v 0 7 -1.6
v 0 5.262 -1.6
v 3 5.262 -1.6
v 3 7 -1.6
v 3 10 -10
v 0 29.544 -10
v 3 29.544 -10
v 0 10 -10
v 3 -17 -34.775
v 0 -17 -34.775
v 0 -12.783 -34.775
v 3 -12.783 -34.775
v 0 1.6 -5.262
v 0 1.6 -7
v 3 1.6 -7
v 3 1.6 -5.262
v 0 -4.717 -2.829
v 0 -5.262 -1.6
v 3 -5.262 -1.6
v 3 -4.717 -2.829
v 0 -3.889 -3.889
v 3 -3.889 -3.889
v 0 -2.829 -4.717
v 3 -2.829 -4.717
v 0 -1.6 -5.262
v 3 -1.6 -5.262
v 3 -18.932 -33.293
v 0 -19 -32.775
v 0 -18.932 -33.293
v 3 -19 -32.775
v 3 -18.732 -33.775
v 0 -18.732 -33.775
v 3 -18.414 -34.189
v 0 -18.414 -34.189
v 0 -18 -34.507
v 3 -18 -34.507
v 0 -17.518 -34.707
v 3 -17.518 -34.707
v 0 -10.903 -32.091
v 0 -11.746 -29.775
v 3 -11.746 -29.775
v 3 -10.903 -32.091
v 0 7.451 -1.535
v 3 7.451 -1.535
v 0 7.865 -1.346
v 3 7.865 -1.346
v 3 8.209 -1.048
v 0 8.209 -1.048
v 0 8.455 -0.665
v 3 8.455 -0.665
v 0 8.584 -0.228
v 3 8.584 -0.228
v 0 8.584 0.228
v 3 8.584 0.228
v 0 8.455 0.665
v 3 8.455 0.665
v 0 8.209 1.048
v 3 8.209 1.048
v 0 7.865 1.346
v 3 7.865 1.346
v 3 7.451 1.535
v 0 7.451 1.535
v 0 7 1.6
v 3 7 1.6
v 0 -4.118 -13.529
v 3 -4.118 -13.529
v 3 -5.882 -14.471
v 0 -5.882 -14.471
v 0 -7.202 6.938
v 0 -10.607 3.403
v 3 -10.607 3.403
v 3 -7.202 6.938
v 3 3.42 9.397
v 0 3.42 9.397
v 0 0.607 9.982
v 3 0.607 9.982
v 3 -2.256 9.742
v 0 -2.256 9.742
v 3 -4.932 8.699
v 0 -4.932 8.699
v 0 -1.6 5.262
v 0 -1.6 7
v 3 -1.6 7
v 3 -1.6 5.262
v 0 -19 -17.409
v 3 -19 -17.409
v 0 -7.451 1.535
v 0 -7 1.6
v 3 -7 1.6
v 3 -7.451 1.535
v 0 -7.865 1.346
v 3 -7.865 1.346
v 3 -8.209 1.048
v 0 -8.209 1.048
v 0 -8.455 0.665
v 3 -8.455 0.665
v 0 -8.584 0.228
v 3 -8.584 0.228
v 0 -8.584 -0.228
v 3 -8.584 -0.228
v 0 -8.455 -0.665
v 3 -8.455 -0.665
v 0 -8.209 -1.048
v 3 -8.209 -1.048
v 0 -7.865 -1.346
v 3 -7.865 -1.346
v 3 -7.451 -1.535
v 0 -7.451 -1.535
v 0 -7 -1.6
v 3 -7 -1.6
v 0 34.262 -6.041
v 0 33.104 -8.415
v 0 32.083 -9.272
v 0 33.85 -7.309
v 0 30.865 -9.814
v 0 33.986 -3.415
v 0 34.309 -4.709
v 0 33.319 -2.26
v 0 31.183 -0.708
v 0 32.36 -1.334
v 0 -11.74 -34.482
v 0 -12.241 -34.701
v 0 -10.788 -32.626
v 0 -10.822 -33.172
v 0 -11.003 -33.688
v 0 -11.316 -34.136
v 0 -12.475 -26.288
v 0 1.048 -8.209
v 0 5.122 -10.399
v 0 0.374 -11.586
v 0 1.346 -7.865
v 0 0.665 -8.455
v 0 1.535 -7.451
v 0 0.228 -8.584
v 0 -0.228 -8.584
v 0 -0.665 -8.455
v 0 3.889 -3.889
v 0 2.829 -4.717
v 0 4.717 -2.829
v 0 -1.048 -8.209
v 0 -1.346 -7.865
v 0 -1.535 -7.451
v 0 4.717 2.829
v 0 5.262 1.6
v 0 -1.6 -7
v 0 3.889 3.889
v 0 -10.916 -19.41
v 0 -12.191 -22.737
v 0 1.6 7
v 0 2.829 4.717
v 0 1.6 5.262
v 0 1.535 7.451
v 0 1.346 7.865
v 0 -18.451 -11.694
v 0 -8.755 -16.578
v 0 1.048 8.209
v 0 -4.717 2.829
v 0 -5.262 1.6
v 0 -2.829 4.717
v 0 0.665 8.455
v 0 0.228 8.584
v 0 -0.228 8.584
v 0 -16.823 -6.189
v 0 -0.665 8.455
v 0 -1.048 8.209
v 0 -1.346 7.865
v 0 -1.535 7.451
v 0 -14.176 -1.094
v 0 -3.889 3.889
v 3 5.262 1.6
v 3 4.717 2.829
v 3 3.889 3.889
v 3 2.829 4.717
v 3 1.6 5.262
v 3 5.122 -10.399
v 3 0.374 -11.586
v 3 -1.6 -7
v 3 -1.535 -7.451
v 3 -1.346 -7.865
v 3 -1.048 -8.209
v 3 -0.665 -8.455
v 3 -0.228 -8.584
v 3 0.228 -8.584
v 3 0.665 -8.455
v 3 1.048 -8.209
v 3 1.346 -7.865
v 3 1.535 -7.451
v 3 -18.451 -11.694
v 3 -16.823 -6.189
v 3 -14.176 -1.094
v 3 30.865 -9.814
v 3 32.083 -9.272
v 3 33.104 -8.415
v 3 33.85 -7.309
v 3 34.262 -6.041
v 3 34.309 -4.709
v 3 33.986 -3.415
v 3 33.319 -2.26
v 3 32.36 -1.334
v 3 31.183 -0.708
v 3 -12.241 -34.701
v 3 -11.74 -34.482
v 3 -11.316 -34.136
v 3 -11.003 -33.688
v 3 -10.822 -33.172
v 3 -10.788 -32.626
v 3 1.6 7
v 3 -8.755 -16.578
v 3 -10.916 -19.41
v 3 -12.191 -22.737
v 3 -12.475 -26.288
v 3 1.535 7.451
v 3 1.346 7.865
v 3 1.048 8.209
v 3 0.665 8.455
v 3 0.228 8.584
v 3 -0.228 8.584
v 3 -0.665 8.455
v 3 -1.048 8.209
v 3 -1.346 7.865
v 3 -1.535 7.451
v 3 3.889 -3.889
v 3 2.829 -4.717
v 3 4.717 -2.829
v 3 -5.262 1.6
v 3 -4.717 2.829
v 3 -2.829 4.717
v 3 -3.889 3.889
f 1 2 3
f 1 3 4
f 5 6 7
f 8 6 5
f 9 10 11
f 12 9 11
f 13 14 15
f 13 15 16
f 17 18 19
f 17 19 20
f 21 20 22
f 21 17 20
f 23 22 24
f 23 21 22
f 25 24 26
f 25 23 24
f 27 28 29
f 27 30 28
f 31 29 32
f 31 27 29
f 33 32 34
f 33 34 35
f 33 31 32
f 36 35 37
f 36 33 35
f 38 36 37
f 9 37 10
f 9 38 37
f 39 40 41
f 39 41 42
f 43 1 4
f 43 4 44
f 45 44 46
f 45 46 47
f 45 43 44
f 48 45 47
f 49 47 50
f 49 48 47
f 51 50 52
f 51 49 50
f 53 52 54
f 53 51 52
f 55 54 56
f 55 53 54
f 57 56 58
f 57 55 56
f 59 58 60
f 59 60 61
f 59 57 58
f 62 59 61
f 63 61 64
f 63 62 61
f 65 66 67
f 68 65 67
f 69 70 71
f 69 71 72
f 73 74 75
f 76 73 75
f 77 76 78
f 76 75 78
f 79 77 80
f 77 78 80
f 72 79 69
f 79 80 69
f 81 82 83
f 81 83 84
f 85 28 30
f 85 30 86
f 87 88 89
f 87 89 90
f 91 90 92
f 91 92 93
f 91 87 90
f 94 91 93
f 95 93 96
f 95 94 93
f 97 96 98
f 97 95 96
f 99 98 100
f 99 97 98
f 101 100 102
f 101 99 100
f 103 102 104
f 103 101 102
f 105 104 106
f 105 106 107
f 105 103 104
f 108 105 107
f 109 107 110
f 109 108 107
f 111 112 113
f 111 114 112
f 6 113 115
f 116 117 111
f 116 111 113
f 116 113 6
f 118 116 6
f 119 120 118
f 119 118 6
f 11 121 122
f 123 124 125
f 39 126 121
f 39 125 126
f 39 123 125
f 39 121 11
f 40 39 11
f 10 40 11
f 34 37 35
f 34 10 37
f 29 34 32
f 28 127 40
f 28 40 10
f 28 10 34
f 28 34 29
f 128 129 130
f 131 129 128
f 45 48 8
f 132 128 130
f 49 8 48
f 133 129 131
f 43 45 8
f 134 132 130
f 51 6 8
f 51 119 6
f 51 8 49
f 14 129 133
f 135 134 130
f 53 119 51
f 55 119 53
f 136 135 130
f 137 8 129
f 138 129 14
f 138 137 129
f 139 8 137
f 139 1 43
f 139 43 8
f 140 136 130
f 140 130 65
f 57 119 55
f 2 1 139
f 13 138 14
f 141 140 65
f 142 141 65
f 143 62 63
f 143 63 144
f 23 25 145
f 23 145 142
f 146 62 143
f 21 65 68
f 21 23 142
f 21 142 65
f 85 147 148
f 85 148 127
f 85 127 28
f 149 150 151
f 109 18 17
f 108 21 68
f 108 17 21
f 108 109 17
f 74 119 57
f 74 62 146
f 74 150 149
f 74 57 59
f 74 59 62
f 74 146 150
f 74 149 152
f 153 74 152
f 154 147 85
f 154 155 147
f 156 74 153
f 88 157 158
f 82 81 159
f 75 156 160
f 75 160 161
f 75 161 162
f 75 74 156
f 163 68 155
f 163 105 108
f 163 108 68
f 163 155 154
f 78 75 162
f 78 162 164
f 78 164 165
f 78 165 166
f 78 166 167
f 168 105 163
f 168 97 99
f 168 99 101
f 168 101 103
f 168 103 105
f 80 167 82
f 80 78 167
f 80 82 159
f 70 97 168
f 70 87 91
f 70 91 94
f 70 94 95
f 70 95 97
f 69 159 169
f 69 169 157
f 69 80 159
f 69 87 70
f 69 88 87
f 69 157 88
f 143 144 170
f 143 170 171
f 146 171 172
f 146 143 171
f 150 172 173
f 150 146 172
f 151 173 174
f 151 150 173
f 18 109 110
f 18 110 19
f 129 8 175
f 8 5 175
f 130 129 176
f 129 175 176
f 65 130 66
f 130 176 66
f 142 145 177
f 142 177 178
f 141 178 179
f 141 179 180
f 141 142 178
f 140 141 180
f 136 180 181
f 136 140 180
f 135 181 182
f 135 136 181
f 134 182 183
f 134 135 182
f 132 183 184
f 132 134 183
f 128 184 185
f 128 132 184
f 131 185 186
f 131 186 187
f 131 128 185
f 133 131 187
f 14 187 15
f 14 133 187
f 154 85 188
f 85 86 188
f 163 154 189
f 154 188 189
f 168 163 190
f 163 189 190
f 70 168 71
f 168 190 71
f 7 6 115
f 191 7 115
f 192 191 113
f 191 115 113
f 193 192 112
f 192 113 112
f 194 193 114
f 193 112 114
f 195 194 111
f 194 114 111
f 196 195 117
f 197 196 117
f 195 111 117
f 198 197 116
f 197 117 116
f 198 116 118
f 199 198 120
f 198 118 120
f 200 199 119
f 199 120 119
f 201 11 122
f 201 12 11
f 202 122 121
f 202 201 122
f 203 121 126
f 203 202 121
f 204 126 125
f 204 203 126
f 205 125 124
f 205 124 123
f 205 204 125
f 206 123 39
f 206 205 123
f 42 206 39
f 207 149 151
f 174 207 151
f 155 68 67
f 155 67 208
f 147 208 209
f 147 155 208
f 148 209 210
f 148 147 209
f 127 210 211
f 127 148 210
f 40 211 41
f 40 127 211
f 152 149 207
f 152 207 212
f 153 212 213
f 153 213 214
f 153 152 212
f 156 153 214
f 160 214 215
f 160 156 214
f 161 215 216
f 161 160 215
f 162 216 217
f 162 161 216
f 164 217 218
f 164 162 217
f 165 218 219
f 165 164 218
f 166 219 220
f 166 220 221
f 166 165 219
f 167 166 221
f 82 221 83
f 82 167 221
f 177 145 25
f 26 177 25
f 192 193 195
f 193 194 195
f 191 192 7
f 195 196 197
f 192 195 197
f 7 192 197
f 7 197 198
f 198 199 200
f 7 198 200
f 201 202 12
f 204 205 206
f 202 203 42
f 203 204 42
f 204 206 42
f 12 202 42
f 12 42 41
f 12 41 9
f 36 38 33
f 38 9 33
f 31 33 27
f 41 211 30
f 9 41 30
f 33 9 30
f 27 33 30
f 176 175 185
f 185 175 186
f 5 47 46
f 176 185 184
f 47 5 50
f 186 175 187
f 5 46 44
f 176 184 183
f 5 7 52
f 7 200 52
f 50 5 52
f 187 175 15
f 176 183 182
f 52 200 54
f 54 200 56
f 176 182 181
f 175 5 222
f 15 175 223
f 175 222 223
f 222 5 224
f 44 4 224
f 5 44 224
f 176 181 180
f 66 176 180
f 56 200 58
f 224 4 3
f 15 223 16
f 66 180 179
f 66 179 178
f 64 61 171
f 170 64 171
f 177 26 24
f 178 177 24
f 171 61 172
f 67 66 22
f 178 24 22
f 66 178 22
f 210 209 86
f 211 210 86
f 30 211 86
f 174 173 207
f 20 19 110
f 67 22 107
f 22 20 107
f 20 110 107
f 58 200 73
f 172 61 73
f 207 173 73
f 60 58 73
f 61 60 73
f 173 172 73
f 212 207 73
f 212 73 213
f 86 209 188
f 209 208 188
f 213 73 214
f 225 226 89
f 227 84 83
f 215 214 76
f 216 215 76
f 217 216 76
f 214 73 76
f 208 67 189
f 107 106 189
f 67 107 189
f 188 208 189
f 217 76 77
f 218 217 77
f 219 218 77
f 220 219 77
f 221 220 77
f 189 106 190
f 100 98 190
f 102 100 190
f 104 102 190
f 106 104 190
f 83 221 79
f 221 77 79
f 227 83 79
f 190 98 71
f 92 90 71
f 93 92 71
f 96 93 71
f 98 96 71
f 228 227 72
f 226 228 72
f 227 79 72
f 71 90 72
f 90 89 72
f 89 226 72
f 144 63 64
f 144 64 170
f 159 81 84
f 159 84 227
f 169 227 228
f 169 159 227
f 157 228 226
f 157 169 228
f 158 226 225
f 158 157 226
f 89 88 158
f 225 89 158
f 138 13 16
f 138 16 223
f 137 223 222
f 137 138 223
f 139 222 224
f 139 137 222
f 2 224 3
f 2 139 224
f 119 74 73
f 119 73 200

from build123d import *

# Parameters (mm, degrees)
PAD054_DEPTH = 3
FILLET009_R  = 2
FILLET010_R  = 30


with BuildPart() as part:
    # Sketch105 → Pad054 (new body)
    with BuildSketch(Plane.YZ):
        with BuildLine():
            Line((-19, -34.775252), (-19, -5.310494))
            Line((-19, -5.310494), (-7.202157, 6.937502))
            ThreePointArc((3.420201, 9.396926), (-2.255657, 9.74228), (-7.202157, 6.937502))
            Line((3.420201, 9.396926), (31.182699, -0.707796))
            ThreePointArc((29.544233, -10), (34.262008, -6.041316), (31.182699, -0.707796))
            Line((29.544233, -10), (2.5, -10))
            Line((2.5, -10), (-5.882353, -14.470588))
            ThreePointArc((-5.882353, -14.470588), (-11.672587, -21.027783), (-11.746158, -29.775252))
            Line((-11.746158, -29.775252), (-9.926307, -34.775252))
            Line((-19, -34.775252), (-9.926307, -34.775252))
        make_face()
        with BuildLine():
            ThreePointArc((-7, 1.6), (-8.6, 0), (-7, -1.6))
            Line((-7, -1.6), (-5.262129, -1.6))
            ThreePointArc((-5.262129, -1.6), (-3.889087, -3.889087), (-1.6, -5.262129))
            Line((-1.6, -7), (-1.6, -5.262129))
            ThreePointArc((-1.6, -7), (0, -8.6), (1.6, -7))
            Line((1.6, -7), (1.6, -5.262129))
            ThreePointArc((1.6, -5.262129), (3.889087, -3.889087), (5.262129, -1.6))
            Line((5.262129, -1.6), (7, -1.6))
            ThreePointArc((7, -1.6), (8.6, 0), (7, 1.6))
            Line((7, 1.6), (5.262129, 1.6))
            ThreePointArc((5.262129, 1.6), (3.889087, 3.889087), (1.6, 5.262129))
            Line((1.6, 7), (1.6, 5.262129))
            ThreePointArc((1.6, 7), (0, 8.6), (-1.6, 7))
            Line((-1.6, 7), (-1.6, 5.262129))
            ThreePointArc((-1.6, 5.262129), (-3.889087, 3.889087), (-5.262129, 1.6))
            Line((-7, 1.6), (-5.262129, 1.6))
        make_face(mode=Mode.SUBTRACT)
    extrude(amount=PAD054_DEPTH)

    # Fillet009
    fillet009_edges = [part.edges().sort_by_distance(p)[0] for p in [
        (1.5, -9.926307, -34.775252),
        (1.5, -19, -34.775252),
    ]]
    fillet(fillet009_edges, radius=FILLET009_R)

    # Fillet010
    fillet010_edges = [part.edges().sort_by_distance(p)[0] for p in [
        (1.5, -19, -5.310494),
        (1.5, 2.5, -10),
    ]]
    fillet(fillet010_edges, radius=FILLET010_R)


solid = part.part
